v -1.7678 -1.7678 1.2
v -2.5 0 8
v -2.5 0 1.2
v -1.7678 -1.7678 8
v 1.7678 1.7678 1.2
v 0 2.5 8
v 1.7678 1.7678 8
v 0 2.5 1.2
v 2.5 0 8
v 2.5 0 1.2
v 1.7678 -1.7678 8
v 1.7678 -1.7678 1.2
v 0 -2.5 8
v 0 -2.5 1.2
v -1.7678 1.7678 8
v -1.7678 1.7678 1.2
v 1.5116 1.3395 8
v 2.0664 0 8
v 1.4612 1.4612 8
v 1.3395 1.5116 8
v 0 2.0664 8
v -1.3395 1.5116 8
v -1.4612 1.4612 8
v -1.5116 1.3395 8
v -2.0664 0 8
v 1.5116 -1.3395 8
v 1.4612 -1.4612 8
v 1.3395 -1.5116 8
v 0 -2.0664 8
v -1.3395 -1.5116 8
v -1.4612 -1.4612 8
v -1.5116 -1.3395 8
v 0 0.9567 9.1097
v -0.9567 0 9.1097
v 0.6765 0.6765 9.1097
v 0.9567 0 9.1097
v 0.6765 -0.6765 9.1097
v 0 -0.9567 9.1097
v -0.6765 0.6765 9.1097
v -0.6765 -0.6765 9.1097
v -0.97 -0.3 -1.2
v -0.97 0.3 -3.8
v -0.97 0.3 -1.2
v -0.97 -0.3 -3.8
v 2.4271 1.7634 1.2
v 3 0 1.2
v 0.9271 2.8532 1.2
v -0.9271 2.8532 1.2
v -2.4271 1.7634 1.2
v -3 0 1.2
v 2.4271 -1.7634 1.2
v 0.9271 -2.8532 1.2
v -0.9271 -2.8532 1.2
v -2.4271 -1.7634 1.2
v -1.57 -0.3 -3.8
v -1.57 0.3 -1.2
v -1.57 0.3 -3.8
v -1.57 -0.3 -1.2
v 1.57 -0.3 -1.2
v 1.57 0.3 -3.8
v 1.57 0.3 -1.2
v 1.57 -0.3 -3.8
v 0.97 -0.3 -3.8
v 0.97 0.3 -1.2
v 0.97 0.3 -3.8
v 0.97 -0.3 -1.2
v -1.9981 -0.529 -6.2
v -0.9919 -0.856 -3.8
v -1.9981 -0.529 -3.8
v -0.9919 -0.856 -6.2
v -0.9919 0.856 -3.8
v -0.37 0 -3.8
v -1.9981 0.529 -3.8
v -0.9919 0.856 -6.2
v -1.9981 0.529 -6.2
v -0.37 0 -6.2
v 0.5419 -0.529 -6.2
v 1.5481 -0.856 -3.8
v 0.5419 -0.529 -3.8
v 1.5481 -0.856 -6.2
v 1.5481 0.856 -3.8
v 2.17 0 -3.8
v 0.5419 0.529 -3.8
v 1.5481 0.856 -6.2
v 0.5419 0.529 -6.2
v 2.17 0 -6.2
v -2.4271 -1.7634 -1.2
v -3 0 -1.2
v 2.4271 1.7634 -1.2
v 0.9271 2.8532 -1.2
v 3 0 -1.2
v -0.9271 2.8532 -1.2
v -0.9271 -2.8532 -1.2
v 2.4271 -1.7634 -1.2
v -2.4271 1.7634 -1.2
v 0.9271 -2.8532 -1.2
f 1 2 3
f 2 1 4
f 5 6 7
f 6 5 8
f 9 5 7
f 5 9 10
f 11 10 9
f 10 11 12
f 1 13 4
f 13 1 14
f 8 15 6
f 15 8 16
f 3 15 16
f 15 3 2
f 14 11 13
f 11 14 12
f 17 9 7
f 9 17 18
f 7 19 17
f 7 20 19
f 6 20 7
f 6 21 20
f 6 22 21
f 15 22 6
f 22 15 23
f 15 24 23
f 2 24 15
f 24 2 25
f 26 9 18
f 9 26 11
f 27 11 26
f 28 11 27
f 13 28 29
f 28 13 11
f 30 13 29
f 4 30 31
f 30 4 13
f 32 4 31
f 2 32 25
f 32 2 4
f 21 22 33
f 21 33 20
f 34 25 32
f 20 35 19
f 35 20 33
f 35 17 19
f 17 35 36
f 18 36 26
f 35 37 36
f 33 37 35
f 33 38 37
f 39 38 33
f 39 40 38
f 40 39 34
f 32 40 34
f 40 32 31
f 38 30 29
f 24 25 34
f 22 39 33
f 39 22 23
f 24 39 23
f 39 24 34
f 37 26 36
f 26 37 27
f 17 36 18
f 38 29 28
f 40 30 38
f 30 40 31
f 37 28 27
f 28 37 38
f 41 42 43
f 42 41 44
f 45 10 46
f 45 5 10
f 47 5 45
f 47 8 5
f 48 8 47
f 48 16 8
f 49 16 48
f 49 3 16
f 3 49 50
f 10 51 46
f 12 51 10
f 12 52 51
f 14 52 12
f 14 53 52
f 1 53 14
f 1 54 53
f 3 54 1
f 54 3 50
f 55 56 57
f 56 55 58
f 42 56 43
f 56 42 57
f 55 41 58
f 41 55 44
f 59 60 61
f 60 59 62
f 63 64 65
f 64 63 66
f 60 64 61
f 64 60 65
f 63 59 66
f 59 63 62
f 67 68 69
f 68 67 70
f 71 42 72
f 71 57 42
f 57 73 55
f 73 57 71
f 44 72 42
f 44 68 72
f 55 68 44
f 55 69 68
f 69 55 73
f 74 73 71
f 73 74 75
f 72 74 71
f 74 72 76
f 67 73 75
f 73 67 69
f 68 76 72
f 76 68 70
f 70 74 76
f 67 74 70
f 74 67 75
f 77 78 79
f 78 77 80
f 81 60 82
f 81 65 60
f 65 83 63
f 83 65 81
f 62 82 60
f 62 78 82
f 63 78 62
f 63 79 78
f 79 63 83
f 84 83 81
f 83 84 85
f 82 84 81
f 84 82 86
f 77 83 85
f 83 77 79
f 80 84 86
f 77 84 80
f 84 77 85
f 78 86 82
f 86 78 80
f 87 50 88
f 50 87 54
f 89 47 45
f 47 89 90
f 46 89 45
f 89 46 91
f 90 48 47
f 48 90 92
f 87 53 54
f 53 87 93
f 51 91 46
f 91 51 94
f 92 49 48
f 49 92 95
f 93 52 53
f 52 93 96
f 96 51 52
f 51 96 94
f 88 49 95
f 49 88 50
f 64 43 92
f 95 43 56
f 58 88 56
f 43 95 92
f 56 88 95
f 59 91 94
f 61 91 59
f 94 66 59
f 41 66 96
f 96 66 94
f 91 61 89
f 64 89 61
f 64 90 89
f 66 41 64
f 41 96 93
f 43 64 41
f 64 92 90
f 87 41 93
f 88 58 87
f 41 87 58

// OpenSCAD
// Parameters
led_type = 5; //[3:10:1]
lead = 5; //[2.5:15:0.5]
right_angle = 0; //[0:10:1]
eps = 0.8; //[0.5:2:0.1]
body_d = 5; //[2.5:10:0.5]
body_h = 8; //[4:16:0.5]
rim_t = 1.2; //[0.6:2.4:0.1]
rim_d = 6; //[3:12:0.5]
lead_t = 0.6; //[0.3:1.2:0.05]
lead_pitch = 2.54; //[1.5:5:0.01]
solder_r = 0.9; //[0.5:2:0.1]
solder_h = 1.2; //[0.6:3:0.1]

// Connectivity overlap (1-2mm) to guarantee solid unions
overlap = 1.2;

// LED Body (base sits on z=0, extends upward)
module led_body() {
  color("red")
    union() {
      // Main cylindrical body: bottom at z=0, top at z=body_h
      translate([0, 0, body_h/2])
        cylinder(r=body_d/2, h=body_h, center=true);

      // Dome: overlaps slightly into the cylinder
      translate([0, 0, body_h - overlap])
        sphere(r=body_d/2);
    }
}

// Rim Flange (centered around z=0, overlaps into body)
module rim_flange() {
  color("red")
    translate([0, 0, rim_t/2 - overlap/2])
      cylinder(r=rim_d/2, h=rim_t + overlap, center=true);
}

// LED Leads (pins) - top of pins overlaps into rim/body (no gap)
module led_leads() {
  // Pin length includes overlap into the LED base
  pin_len = lead + overlap;

  // Place pins so their TOP is at z=overlap (i.e., they extend into the body by 'overlap')
  // For a centered cube: center_z + pin_len/2 = overlap  => center_z = overlap - pin_len/2
  pin_center_z = overlap - pin_len/2;

  color("Silver")
    union() {
      translate([-lead_pitch/2, 0, pin_center_z])
        cube([lead_t, lead_t, pin_len], center=true);

      translate([ lead_pitch/2, 0, pin_center_z])
        cube([lead_t, lead_t, pin_len], center=true);

      if (right_angle > 0) {
        // Keep right-angle feature attached to the vertical pins with overlap
        // Horizontal segment sits near the bottom of the vertical pin
        translate([-lead_pitch/2, -right_angle/2 - lead_t/2 + overlap/2, -lead + lead_t/2])
          cube([lead_t, right_angle + overlap, lead_t], center=true);

        translate([ lead_pitch/2, -right_angle/2 - lead_t/2 + overlap/2, -lead + lead_t/2])
          cube([lead_t, right_angle + overlap, lead_t], center=true);
      }
    }
}

// Solder Ends - overlap into the bottom of the pins (no separation)
module solder_ends() {
  // Put solder so its TOP overlaps into the pin bottom by 'overlap'
  // Pin bottom is at z = overlap - pin_len = overlap - (lead+overlap) = -lead
  // So pin bottom is exactly at z=-lead. Make solder top at z=-lead + overlap.
  // For centered cylinder: center_z + (solder_h+overlap)/2 = -lead + overlap
  solder_len = solder_h + overlap;
  solder_center_z = (-lead + overlap) - solder_len/2;

  color("Silver")
    union() {
      translate([-lead_pitch/2, 0, solder_center_z])
        cylinder(r=solder_r, h=solder_len, center=true);

      translate([ lead_pitch/2, 0, solder_center_z])
        cylinder(r=solder_r, h=solder_len, center=true);
    }
}

// Complete LED Assembly (single connected solid via union)
module led() {
  union() {
    rim_flange();
    led_body();
    led_leads();
    solder_ends();
  }
}

// Final Assembly
module assembly() {
  led();
}

assembly();
